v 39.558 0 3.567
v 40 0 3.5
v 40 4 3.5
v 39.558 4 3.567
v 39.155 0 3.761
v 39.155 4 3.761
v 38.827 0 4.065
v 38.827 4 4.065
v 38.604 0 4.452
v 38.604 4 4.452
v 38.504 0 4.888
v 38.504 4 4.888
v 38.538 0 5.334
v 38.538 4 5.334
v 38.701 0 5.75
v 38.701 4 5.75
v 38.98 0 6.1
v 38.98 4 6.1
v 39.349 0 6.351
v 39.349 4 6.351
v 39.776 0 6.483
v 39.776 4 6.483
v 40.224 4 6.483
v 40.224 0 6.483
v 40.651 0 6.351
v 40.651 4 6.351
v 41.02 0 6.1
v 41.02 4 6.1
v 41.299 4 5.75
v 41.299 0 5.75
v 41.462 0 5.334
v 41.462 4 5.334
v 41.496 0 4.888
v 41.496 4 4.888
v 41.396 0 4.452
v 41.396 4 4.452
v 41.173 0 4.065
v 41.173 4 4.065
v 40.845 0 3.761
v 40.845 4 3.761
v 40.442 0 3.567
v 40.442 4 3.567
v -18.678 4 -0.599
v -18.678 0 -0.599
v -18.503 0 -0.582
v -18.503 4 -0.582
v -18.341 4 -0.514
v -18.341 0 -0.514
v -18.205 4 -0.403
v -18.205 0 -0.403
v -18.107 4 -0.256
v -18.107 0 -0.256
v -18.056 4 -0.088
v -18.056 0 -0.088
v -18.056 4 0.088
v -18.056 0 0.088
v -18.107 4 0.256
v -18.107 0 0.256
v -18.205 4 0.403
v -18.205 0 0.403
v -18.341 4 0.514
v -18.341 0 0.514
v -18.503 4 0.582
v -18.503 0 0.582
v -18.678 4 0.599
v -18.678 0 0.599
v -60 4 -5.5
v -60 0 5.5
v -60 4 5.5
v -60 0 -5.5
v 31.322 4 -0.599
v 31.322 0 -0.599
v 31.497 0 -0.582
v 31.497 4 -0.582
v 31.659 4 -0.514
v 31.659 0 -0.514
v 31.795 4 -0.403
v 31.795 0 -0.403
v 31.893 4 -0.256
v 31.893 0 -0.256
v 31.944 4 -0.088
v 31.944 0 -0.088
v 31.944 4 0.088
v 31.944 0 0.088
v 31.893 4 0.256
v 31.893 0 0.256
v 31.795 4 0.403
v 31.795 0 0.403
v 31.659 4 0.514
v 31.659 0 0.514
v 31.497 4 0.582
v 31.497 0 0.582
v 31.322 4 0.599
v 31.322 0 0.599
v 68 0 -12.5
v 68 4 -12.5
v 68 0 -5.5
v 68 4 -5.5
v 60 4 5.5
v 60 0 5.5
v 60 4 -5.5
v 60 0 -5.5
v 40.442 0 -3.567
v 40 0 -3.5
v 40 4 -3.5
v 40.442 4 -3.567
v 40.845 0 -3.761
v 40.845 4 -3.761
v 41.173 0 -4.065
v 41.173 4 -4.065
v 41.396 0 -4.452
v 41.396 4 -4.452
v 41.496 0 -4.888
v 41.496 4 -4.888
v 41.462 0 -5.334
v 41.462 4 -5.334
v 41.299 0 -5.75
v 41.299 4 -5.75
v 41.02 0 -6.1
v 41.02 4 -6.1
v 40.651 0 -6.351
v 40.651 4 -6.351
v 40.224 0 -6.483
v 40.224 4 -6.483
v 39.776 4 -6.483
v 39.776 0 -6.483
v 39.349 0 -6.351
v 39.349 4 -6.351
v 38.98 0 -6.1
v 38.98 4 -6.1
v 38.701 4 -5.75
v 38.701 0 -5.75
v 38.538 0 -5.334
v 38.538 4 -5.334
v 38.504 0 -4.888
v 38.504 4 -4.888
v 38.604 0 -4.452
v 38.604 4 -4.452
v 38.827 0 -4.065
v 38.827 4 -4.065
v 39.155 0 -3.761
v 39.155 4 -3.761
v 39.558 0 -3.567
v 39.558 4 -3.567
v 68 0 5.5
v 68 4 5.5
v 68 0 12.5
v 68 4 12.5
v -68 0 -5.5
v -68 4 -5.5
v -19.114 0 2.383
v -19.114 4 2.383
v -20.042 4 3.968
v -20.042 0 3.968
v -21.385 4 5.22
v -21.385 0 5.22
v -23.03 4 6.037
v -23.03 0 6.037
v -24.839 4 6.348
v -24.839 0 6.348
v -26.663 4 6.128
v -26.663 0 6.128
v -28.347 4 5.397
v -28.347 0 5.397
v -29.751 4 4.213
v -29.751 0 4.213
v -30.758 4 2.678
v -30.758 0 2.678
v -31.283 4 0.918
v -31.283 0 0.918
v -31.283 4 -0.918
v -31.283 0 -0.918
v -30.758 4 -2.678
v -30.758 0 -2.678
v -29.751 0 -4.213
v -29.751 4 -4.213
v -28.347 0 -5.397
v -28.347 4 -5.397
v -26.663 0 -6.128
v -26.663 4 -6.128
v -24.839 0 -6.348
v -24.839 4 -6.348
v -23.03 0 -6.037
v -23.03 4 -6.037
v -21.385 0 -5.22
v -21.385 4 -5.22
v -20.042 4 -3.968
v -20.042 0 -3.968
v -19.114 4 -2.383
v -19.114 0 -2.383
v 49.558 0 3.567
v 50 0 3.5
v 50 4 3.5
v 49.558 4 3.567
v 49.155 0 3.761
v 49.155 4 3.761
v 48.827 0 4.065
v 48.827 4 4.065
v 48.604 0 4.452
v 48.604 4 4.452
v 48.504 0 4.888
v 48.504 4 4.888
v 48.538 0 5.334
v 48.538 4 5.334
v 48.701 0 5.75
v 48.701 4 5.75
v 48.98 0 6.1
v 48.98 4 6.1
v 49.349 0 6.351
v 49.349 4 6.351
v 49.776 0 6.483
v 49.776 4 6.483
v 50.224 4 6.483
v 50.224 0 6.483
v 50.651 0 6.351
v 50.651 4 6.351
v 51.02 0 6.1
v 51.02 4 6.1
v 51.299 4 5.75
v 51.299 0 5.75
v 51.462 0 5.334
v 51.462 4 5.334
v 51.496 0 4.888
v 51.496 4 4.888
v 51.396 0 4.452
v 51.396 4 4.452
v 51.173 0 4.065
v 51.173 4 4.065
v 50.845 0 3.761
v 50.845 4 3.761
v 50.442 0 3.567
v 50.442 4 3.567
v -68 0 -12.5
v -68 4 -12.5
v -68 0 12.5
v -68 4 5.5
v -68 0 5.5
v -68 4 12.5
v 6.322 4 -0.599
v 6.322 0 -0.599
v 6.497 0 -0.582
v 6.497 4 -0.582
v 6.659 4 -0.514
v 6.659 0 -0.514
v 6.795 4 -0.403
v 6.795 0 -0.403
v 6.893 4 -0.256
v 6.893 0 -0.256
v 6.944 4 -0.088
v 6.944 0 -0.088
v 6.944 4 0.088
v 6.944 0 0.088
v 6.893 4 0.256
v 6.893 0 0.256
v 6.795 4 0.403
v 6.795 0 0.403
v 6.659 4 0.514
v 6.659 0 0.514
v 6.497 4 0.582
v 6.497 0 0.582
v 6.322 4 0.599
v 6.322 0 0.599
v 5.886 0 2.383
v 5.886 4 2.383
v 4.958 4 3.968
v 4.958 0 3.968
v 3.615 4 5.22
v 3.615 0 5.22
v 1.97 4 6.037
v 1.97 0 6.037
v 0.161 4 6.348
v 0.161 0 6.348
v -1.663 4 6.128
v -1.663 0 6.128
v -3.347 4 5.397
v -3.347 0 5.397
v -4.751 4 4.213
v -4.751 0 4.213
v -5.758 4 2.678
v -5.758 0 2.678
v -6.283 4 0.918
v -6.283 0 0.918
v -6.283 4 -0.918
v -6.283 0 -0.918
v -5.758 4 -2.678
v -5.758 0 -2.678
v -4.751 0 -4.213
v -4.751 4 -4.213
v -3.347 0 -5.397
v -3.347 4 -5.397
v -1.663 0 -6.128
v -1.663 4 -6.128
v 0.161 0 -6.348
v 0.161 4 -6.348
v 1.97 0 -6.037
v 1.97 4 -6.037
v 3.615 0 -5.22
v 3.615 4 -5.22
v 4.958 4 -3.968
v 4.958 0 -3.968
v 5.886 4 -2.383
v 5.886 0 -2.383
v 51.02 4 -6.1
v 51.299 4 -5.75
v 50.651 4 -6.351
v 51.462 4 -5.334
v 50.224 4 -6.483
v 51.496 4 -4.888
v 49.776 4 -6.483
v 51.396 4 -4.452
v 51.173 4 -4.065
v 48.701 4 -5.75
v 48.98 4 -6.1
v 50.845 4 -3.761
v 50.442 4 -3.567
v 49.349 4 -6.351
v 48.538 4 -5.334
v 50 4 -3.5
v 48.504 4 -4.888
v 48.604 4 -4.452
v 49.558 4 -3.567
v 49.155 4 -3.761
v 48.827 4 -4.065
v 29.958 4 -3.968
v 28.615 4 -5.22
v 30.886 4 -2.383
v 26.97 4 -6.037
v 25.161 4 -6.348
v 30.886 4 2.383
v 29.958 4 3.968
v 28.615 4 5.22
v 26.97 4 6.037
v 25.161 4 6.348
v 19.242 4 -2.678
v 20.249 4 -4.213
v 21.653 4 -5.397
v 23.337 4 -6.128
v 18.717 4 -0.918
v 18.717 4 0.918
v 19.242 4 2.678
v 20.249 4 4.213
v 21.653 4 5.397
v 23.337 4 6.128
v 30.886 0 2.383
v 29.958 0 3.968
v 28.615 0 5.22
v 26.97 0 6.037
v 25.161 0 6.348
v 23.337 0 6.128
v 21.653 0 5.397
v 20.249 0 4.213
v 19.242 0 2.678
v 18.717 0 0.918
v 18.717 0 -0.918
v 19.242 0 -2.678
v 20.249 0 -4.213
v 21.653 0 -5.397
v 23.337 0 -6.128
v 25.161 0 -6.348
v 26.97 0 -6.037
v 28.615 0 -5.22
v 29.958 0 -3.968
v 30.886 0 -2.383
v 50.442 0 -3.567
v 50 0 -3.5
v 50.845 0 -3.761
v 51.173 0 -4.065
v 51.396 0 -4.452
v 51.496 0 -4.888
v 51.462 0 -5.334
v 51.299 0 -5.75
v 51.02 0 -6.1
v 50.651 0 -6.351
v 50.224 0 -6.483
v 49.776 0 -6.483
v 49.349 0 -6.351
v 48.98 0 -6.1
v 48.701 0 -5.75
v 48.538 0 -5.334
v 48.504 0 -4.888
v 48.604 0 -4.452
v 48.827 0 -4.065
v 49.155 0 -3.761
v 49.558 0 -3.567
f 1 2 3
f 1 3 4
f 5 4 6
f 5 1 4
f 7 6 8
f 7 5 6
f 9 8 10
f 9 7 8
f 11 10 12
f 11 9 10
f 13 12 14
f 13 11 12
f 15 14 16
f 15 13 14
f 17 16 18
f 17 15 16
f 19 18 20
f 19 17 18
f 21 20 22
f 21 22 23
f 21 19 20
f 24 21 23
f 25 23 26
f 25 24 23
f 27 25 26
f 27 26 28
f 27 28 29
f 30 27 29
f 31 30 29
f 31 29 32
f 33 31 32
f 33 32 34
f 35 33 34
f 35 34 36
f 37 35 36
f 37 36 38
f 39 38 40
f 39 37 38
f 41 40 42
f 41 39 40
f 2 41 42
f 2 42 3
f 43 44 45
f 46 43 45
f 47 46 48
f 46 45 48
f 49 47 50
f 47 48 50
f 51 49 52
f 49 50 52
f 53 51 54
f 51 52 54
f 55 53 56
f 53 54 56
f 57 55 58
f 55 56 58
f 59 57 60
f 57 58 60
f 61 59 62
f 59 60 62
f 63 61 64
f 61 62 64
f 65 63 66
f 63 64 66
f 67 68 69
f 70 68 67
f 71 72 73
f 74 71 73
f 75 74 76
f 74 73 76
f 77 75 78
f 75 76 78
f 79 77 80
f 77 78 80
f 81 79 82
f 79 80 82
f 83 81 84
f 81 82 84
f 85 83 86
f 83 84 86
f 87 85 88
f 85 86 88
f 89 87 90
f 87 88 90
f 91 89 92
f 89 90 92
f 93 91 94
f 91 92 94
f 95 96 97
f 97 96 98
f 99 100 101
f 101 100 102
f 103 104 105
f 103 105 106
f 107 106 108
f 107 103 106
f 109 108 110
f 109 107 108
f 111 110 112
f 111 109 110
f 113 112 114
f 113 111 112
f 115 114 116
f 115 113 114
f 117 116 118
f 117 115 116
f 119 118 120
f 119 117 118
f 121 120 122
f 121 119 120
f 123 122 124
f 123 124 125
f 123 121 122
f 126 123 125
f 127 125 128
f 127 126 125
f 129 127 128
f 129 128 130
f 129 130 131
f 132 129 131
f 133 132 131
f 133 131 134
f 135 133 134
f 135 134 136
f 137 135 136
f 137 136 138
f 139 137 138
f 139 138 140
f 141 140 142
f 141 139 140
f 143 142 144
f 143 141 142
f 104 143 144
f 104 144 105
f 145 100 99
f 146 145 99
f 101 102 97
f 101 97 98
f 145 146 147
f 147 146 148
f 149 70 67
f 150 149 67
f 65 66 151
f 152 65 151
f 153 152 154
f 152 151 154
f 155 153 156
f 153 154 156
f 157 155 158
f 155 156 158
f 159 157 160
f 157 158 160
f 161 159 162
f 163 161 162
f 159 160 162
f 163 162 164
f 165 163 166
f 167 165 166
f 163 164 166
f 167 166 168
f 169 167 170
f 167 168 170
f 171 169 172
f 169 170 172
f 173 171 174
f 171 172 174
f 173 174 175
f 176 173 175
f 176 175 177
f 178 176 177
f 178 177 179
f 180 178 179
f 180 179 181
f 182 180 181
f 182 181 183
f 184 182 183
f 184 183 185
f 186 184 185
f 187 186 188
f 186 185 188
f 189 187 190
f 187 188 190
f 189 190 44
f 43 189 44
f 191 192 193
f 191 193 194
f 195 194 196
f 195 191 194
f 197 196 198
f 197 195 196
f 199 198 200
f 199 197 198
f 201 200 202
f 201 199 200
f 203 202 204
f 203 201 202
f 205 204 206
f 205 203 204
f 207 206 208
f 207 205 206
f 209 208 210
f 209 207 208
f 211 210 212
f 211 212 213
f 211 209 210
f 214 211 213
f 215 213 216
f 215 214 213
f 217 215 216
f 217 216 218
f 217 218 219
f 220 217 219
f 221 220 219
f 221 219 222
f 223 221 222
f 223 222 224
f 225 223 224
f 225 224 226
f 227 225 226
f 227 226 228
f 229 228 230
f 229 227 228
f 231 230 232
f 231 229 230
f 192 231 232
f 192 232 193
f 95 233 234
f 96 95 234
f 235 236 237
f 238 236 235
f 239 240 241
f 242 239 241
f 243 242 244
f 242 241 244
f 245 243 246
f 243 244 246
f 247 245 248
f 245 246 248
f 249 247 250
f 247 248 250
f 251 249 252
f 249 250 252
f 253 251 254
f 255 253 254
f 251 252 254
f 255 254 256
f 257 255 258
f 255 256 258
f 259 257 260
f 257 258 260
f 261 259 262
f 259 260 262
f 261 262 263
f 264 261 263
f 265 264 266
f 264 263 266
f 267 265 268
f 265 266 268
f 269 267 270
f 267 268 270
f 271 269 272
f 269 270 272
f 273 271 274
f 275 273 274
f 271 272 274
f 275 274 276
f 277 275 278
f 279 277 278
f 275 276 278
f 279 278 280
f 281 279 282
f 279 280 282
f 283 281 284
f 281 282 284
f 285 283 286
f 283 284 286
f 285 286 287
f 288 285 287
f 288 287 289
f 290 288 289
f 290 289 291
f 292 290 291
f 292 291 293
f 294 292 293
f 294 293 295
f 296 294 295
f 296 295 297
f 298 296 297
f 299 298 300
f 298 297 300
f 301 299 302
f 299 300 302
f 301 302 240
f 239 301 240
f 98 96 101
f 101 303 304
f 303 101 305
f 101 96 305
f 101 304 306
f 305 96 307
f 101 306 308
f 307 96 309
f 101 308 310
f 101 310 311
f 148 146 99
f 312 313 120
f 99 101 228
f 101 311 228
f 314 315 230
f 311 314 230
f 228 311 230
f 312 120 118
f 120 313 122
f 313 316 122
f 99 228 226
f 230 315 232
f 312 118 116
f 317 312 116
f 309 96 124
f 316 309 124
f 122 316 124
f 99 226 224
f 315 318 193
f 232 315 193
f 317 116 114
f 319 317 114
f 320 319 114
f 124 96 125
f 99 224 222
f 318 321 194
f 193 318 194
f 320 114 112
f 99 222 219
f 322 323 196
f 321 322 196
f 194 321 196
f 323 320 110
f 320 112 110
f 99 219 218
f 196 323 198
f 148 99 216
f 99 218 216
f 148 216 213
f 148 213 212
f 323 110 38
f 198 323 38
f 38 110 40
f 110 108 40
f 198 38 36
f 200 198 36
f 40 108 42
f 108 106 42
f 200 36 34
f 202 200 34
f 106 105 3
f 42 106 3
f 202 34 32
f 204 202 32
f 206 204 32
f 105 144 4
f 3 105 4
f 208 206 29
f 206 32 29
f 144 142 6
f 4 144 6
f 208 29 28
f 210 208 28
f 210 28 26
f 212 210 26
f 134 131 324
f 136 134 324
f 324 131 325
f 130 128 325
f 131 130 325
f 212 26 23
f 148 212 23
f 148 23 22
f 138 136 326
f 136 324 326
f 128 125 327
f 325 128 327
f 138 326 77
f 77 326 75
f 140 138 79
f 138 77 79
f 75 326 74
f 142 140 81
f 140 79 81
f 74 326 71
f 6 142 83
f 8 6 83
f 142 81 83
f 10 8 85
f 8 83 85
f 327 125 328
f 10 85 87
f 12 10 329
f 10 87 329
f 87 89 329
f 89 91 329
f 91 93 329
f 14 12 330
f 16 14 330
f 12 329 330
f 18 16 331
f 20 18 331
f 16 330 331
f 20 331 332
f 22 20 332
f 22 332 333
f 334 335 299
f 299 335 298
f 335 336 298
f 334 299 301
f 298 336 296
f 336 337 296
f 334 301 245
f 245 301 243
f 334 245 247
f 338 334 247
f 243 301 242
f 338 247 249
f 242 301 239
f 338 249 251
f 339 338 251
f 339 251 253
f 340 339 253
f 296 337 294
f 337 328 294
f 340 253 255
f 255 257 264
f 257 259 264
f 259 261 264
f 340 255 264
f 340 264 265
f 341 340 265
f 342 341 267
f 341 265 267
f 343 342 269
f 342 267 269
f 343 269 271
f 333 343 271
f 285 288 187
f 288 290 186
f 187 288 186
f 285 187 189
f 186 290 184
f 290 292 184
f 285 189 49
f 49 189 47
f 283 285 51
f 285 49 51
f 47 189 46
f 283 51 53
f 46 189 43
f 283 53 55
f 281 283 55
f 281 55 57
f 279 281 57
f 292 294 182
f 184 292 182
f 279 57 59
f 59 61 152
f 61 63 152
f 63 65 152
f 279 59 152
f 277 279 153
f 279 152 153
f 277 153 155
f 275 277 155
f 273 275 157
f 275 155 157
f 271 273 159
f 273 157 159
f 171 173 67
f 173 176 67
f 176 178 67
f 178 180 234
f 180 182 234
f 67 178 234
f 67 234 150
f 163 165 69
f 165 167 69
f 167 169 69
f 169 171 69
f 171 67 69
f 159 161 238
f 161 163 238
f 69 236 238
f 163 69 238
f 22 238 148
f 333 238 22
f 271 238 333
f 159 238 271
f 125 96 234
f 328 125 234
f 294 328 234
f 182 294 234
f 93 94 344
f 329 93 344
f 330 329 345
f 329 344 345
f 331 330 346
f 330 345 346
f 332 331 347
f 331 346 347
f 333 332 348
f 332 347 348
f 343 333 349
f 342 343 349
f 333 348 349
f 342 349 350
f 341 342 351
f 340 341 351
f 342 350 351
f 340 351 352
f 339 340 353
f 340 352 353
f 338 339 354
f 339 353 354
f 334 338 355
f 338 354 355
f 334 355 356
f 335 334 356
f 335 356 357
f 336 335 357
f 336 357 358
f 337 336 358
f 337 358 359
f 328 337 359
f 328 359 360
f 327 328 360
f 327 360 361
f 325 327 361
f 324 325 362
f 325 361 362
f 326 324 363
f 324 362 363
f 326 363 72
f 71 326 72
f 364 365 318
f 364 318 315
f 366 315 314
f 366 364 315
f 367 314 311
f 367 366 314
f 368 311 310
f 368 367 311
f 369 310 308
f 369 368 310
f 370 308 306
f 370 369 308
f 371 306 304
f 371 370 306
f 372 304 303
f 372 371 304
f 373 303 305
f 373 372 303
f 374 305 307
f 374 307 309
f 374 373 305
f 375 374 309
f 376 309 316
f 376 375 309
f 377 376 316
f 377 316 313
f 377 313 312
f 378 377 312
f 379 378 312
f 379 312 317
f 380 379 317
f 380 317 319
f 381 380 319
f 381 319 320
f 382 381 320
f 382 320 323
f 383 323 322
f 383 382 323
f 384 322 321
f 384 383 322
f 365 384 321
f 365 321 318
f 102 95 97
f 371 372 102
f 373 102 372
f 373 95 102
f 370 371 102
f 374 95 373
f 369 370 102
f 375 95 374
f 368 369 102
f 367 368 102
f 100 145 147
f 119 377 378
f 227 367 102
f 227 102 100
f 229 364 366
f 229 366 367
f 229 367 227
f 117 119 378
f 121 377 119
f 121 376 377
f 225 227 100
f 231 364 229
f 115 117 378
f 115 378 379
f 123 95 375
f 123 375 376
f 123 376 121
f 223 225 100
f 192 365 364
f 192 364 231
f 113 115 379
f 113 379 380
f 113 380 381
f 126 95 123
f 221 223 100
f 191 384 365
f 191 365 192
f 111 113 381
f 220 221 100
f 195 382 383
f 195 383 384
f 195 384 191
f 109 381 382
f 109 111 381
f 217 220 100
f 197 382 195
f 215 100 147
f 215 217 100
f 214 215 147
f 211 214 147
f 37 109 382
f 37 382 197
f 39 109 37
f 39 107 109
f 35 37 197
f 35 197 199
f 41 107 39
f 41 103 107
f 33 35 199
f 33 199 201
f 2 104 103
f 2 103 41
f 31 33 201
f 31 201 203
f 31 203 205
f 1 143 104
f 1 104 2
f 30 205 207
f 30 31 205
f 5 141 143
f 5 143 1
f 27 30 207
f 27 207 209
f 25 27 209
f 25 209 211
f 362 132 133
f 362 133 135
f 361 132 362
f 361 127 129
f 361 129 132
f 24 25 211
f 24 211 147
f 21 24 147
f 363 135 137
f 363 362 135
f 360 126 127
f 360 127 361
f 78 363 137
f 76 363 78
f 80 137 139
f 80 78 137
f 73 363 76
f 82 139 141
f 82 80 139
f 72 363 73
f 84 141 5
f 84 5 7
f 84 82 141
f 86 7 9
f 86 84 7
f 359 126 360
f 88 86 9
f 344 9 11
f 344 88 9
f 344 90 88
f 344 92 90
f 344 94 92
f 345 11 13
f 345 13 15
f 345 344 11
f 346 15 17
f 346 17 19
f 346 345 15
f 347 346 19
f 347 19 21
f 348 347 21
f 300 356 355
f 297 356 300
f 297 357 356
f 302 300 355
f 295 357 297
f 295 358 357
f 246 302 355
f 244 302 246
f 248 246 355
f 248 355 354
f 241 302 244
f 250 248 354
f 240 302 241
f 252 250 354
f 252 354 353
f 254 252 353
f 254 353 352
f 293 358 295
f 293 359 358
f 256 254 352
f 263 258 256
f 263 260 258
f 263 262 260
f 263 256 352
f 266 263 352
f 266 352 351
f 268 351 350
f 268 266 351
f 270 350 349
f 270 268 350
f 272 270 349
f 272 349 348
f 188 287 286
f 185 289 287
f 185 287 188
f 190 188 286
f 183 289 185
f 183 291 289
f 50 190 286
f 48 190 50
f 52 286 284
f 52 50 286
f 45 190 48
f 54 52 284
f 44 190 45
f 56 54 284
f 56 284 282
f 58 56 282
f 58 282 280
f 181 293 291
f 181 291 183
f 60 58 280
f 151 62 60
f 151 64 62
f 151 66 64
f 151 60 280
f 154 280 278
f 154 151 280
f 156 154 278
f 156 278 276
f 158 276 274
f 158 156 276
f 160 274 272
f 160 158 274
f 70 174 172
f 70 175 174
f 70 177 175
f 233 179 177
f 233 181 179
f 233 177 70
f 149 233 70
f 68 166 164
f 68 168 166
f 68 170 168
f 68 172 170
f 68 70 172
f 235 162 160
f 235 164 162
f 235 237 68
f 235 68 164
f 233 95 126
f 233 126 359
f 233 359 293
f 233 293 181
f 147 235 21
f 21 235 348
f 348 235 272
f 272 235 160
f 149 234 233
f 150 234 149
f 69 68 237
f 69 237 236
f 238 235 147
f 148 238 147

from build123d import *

# Parameters (mm, degrees)
SKETCH1_W           = 120
SKETCH1_H           = 25
SKETCH1_R           = 1.5
BOSS_EXTRUDE1_DEPTH = 4
SKETCH2_W           = 7
SKETCH2_H           = 4
BOSS_EXTRUDE2_DEPTH = 8


with BuildPart() as part:
    # Sketch1 → Boss-Extrude1 (new body)
    with BuildSketch(Plane(origin=(0, 0, 0), x_dir=(1, 0, 0), z_dir=(0, 1, 0))):
        Rectangle(SKETCH1_W, SKETCH1_H)
        with Locations(Location((40, 5, 0), (0, 0, 270))):
            Circle(SKETCH1_R, mode=Mode.SUBTRACT)
        with Locations(Location((40, -5, 0), (0, 0, 90))):
            Circle(SKETCH1_R, mode=Mode.SUBTRACT)
        with Locations(Location((50, 5, 0), (0, 0, 270))):
            Circle(SKETCH1_R, mode=Mode.SUBTRACT)
        with Locations(Location((50, -5, 0), (0, 0, 90))):
            Circle(SKETCH1_R, mode=Mode.SUBTRACT)
        with BuildLine():
            ThreePointArc((31.321653543, 0.599330025), (31.95, 0), (31.321653543, -0.599330025))
            ThreePointArc((31.321653543, -0.599330025), (18.65, 0), (31.321653543, 0.599330025))
        make_face(mode=Mode.SUBTRACT)
        with BuildLine():
            ThreePointArc((6.321653543, 0.599330025), (6.95, 0), (6.321653543, -0.599330025))
            ThreePointArc((6.321653543, -0.599330025), (-6.35, 0), (6.321653543, 0.599330025))
        make_face(mode=Mode.SUBTRACT)
        with BuildLine():
            ThreePointArc((-18.678346457, 0.599330025), (-18.05, 0), (-18.678346457, -0.599330025))
            ThreePointArc((-18.678346457, -0.599330025), (-31.35, 0), (-18.678346457, 0.599330025))
        make_face(mode=Mode.SUBTRACT)
    extrude(amount=BOSS_EXTRUDE1_DEPTH)

    # Sketch2 → Boss-Extrude2 (add)
    with BuildSketch(Plane.ZY.offset(60)):
        with Locations((-9, 2)):
            Rectangle(SKETCH2_W, SKETCH2_H)
        with Locations((9, 2)):
            Rectangle(SKETCH2_W, SKETCH2_H)
    boss_extrude2 = extrude(amount=BOSS_EXTRUDE2_DEPTH)

    # Mirror1: Boss-Extrude2 across plane
    add(boss_extrude2.mirror(Plane.ZY))


solid = part.part
